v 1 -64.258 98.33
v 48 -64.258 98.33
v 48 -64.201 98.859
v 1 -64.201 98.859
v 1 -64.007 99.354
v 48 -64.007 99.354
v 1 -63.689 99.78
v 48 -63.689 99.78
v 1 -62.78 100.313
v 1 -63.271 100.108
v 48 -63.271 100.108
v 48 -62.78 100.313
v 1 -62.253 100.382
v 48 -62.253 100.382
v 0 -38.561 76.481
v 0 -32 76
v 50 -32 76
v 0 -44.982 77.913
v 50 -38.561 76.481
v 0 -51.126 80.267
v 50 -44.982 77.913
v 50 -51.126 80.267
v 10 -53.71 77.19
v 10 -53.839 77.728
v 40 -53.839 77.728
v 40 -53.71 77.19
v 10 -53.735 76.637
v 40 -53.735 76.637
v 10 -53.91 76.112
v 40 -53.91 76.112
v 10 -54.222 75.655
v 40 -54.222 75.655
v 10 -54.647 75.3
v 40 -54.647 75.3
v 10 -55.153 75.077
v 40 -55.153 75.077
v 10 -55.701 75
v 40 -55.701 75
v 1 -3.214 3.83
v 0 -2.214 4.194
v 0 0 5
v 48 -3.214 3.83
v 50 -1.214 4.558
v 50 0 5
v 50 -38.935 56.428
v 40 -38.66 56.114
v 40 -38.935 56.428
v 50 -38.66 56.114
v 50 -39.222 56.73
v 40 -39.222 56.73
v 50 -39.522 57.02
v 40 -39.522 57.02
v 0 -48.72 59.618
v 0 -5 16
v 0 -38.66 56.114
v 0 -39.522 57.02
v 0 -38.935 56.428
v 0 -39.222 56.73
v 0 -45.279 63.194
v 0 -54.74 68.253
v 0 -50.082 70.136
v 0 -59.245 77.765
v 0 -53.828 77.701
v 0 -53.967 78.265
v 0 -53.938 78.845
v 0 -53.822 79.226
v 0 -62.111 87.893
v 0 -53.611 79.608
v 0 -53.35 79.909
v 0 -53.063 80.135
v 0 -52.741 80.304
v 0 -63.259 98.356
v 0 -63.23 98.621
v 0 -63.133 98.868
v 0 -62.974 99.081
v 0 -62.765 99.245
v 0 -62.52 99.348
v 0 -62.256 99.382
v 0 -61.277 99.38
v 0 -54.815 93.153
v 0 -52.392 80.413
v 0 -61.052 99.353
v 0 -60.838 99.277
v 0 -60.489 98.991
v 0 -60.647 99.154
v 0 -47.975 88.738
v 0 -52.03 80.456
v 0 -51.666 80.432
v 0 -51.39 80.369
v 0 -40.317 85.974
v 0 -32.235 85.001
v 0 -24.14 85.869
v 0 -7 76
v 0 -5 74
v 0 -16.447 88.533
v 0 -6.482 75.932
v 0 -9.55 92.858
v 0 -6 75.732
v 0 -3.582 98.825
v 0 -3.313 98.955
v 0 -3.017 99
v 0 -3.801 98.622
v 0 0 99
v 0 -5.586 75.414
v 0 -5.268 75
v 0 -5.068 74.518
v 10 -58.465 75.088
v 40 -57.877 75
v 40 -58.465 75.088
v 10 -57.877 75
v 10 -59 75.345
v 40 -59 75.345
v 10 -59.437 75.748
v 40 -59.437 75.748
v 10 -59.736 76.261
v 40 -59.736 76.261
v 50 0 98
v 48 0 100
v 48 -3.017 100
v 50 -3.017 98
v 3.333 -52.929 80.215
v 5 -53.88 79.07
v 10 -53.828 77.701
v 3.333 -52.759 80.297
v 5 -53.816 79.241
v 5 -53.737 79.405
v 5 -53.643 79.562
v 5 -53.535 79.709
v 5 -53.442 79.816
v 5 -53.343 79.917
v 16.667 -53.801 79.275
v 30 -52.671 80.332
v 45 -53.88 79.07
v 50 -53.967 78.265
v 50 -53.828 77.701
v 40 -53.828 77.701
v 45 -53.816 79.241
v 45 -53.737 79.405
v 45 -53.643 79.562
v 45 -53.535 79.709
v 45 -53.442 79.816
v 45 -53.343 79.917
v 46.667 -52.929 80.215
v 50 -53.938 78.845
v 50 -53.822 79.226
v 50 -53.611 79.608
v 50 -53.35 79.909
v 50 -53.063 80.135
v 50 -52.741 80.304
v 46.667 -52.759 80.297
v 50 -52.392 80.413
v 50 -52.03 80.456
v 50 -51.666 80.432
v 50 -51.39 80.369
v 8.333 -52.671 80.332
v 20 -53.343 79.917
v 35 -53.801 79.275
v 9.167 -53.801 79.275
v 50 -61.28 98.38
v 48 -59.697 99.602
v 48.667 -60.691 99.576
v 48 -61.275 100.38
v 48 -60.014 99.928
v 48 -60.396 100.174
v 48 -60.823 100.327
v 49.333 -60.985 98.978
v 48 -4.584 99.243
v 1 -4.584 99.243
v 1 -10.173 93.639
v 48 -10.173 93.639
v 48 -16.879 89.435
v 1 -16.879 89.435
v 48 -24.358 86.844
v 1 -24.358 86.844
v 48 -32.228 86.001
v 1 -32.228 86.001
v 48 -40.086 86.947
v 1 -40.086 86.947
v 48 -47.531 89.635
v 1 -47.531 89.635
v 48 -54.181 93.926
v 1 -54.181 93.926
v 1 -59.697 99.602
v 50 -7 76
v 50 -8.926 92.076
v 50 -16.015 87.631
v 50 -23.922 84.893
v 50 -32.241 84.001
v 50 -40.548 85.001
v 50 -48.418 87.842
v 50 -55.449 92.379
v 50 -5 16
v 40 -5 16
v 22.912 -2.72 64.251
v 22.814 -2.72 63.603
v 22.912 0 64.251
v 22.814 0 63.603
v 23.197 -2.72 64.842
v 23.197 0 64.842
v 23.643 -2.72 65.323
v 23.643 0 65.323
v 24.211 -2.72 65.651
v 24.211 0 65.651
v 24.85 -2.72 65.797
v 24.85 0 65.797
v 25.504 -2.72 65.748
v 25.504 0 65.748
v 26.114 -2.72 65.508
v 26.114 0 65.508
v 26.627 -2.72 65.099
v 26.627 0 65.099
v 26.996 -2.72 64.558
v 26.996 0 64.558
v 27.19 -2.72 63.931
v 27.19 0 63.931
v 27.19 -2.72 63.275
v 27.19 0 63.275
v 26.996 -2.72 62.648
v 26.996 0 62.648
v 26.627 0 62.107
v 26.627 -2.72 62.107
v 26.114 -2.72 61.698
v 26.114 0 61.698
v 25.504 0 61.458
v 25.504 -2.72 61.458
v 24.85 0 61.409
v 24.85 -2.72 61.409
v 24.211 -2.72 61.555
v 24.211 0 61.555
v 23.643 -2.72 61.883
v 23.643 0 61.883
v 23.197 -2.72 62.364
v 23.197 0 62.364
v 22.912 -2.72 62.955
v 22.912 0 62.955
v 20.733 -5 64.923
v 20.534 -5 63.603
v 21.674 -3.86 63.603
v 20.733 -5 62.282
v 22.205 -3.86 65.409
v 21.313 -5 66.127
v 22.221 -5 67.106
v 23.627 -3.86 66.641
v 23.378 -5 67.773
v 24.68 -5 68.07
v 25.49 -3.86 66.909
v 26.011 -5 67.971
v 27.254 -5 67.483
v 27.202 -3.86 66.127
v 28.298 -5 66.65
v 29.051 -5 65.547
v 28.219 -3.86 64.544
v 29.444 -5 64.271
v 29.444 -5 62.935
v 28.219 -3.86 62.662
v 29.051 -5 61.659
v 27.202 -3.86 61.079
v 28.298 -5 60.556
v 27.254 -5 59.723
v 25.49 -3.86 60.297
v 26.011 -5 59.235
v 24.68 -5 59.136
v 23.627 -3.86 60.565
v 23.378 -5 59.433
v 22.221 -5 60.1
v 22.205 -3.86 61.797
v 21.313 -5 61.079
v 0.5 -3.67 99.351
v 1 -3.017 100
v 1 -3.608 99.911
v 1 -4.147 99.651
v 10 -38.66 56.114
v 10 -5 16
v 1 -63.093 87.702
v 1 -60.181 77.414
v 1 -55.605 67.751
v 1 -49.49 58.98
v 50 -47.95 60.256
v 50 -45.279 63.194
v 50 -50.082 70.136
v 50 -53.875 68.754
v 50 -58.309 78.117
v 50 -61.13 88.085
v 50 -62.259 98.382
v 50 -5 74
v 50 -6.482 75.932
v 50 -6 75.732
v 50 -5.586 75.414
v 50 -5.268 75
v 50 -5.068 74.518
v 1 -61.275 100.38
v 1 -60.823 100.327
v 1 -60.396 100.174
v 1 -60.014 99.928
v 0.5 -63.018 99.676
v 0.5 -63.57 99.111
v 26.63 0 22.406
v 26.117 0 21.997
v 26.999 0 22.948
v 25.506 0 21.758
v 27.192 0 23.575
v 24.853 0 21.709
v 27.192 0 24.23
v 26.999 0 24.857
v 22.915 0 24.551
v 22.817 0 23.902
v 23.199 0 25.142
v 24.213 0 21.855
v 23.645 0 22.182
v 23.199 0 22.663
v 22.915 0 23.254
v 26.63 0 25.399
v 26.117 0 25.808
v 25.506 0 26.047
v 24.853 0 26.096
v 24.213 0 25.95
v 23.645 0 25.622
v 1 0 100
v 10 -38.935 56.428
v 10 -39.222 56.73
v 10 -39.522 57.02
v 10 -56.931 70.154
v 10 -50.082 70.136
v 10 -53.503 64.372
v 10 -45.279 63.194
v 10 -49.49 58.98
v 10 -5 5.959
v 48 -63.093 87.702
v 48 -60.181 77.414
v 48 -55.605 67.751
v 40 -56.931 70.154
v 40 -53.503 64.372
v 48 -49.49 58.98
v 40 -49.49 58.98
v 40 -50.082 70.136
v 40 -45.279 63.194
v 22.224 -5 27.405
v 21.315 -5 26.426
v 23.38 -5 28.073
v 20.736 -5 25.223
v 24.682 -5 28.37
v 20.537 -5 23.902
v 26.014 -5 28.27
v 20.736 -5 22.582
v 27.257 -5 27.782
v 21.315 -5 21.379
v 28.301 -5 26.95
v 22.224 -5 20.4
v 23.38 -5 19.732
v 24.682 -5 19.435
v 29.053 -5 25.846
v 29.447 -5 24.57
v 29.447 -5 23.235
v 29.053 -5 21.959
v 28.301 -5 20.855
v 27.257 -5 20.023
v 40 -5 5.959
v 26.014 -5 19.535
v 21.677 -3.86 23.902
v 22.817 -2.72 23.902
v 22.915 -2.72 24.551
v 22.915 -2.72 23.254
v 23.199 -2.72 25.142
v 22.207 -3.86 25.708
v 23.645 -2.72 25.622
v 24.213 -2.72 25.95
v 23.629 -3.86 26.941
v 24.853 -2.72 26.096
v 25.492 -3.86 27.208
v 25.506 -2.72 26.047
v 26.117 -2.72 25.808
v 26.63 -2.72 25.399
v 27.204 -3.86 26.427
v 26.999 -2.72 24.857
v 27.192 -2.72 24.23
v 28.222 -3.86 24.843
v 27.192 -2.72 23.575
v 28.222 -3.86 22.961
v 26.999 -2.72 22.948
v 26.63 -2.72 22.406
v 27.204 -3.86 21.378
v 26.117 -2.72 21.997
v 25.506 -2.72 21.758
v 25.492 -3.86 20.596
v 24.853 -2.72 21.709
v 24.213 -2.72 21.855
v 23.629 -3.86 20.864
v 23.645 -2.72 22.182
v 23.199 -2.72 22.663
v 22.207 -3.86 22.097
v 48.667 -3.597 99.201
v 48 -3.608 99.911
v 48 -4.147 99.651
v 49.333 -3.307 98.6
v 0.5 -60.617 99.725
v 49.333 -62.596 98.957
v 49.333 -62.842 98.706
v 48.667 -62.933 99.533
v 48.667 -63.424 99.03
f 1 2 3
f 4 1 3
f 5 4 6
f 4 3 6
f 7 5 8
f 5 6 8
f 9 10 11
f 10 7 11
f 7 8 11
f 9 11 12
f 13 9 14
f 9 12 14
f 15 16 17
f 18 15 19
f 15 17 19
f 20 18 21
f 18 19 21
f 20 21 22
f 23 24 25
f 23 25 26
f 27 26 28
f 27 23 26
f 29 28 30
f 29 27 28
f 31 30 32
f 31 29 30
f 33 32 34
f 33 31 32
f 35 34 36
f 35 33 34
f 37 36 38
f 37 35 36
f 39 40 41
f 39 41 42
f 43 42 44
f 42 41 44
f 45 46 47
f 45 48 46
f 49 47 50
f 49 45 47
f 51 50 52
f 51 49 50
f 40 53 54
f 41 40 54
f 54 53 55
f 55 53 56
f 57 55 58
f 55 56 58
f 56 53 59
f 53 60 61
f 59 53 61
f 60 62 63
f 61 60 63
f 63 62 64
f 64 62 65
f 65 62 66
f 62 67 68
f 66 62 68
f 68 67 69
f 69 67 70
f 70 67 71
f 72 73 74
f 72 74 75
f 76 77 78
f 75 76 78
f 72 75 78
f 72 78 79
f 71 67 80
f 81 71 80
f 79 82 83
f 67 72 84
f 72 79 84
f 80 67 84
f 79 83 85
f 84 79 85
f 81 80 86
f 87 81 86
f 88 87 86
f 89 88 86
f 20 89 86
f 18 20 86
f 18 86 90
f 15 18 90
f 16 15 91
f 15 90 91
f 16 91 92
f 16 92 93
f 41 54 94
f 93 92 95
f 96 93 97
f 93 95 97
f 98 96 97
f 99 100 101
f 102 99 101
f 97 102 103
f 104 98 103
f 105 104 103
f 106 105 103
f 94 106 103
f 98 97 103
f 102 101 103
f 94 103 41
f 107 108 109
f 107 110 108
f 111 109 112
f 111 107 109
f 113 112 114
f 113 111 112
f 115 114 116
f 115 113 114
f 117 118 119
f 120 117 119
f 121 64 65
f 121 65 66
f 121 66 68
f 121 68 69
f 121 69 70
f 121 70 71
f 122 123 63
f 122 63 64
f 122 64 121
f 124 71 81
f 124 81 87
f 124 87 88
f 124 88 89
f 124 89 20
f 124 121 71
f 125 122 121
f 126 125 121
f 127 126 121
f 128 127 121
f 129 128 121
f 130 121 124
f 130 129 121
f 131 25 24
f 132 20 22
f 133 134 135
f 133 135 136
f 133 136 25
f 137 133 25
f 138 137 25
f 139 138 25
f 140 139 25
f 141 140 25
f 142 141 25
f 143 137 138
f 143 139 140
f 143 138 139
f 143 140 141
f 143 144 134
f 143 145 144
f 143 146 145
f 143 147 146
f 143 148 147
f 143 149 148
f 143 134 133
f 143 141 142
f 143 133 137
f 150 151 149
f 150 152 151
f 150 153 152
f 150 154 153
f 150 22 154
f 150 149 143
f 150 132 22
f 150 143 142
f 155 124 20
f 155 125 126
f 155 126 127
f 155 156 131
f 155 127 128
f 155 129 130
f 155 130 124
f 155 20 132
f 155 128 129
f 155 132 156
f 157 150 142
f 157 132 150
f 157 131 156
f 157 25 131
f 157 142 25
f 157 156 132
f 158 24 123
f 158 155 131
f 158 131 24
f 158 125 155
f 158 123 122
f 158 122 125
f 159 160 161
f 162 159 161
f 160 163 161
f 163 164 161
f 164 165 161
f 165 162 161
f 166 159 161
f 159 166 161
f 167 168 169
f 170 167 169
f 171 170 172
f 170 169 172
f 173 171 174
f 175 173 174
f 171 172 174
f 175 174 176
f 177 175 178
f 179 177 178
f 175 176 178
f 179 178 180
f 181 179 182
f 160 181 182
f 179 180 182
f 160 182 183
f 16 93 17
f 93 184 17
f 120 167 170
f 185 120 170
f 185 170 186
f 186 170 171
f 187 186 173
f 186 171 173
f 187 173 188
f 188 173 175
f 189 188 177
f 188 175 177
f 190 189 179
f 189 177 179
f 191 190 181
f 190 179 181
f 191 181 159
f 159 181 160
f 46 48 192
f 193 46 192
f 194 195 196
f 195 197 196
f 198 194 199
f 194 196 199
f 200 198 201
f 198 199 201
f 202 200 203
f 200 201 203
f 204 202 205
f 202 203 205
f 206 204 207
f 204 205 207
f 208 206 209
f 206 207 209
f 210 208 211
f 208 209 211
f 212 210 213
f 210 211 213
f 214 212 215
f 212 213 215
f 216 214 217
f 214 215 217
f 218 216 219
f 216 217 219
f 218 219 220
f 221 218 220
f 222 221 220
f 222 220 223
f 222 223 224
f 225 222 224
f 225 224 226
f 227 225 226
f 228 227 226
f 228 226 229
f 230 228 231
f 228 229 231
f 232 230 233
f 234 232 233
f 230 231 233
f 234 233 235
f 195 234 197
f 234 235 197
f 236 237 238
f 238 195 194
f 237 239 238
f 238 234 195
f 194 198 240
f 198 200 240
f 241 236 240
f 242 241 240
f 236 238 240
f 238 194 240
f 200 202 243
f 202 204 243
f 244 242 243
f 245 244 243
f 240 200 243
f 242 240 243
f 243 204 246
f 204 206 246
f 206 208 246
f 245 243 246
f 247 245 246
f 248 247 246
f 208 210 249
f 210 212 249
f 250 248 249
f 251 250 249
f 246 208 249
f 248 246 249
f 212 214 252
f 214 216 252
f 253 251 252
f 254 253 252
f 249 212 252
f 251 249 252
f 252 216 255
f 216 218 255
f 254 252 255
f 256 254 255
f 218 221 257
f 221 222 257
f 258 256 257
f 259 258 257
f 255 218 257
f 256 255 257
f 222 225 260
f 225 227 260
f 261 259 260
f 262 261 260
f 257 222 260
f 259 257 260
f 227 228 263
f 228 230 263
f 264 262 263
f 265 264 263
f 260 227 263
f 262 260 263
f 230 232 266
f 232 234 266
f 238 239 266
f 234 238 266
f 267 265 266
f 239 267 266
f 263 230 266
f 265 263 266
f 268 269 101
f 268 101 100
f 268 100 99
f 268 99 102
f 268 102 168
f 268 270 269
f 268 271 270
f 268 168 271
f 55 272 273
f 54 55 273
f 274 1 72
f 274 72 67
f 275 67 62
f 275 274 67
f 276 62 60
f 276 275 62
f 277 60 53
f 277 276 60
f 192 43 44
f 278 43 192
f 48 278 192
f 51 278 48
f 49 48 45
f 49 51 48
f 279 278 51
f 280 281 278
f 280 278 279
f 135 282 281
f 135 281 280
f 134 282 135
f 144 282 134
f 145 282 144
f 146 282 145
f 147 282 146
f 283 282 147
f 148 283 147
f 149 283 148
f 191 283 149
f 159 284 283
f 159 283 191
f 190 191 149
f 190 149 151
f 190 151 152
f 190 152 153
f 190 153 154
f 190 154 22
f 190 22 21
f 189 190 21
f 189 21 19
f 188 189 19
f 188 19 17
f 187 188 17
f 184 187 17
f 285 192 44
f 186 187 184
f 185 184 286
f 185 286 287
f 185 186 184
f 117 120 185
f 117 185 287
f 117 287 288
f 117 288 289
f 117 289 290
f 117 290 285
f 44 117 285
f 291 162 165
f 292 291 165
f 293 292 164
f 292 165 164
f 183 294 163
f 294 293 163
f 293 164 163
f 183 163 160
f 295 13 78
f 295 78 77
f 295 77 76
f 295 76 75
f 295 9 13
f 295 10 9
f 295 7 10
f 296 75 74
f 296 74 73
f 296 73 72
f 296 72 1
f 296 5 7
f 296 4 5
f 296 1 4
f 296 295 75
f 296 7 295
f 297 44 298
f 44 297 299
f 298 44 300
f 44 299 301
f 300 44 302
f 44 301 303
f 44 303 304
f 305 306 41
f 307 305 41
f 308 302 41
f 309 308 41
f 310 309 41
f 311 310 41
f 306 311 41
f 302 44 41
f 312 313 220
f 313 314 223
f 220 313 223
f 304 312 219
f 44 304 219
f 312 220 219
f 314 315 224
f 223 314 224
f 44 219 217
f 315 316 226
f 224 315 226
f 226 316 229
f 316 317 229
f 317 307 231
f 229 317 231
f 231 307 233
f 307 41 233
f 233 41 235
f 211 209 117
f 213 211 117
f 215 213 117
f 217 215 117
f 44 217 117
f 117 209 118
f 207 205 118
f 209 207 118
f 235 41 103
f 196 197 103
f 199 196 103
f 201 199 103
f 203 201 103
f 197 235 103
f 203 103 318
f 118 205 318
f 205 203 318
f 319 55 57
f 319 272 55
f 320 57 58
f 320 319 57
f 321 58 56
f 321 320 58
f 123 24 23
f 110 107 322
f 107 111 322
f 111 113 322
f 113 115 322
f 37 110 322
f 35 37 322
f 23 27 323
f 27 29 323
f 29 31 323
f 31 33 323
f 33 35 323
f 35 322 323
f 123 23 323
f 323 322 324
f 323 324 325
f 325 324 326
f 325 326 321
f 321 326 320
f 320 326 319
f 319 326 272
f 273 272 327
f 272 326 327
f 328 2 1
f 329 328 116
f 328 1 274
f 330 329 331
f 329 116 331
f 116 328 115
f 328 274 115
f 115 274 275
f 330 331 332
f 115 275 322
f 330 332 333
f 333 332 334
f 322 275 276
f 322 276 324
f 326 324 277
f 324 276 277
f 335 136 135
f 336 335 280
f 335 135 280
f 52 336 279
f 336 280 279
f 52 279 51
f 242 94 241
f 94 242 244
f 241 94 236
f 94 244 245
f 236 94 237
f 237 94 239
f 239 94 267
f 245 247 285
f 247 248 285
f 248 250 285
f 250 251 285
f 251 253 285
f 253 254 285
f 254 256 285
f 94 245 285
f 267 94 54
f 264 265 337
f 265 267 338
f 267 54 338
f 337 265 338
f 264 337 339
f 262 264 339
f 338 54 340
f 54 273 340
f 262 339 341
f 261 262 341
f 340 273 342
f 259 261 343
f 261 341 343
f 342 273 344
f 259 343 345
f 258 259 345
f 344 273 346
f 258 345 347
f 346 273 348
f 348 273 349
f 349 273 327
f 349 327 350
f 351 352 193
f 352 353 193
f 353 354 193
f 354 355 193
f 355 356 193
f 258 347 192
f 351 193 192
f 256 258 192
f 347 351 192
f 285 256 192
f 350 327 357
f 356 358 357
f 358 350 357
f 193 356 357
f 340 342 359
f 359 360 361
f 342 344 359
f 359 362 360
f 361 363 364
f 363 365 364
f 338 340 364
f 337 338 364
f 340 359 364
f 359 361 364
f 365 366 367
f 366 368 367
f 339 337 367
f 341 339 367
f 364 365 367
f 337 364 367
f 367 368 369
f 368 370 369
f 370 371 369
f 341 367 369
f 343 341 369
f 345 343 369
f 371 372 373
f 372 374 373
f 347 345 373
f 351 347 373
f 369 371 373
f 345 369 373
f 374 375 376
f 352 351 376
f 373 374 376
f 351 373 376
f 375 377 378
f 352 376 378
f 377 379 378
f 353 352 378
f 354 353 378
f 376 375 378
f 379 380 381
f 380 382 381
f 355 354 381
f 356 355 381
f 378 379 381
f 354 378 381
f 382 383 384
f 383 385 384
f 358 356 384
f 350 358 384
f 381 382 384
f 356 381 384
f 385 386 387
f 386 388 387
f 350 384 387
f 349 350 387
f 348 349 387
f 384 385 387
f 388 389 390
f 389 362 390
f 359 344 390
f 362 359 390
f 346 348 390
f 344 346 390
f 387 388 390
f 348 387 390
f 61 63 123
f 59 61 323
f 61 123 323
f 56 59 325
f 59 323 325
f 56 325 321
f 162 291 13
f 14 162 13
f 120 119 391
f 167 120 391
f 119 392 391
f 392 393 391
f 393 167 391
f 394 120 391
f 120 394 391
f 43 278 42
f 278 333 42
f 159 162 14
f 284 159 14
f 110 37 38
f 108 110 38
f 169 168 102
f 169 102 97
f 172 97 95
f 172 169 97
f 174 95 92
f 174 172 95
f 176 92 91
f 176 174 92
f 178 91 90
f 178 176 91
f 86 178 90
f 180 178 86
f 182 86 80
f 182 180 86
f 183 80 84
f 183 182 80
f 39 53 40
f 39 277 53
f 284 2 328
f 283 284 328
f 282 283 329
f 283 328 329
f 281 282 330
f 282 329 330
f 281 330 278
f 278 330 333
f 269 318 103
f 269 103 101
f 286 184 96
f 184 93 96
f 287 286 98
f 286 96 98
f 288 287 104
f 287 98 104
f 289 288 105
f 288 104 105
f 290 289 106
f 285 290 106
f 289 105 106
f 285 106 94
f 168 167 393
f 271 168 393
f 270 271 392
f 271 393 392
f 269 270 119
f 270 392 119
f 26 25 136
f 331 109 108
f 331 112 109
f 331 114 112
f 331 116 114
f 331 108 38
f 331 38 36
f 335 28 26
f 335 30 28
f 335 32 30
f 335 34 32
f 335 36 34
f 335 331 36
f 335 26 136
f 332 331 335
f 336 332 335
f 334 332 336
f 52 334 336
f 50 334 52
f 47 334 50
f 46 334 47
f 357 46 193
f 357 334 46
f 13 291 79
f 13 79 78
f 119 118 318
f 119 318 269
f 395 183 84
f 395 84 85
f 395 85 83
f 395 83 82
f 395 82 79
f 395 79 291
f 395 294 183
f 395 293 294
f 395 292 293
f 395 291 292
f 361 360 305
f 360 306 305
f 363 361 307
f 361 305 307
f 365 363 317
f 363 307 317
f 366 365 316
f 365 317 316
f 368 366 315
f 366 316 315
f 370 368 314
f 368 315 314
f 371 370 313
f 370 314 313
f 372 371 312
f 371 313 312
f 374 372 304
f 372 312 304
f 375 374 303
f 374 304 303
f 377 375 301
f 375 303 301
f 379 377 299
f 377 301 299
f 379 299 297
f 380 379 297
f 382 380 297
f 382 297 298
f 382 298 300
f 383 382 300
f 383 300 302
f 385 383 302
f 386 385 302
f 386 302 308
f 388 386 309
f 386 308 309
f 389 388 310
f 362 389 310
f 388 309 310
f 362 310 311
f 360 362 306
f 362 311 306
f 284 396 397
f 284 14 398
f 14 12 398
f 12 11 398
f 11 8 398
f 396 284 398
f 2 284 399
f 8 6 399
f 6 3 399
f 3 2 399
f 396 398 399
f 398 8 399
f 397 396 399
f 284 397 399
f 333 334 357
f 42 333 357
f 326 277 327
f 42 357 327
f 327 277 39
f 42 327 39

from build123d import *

# Parameters (mm, degrees)
F1_DEPTH       = 50
F4_DEPTH       = 25
F5_W           = 30
F5_H           = 60
F6_DEPTH       = 75
F8_D           = 4.4
F8_CSINK_D     = 8.96
F8_CSINK_ANGLE = 90
F9_R           = 2
F10_T1_DEPTH   = 30
F11_R          = 10
F12_SIZE       = 1.99999
F13_SIZE       = 1
F14_SIZE       = 5


# Not quite as in the source:
# - a fillet or chamfer that OpenCascade refuses, or shapes differently, is made with other operations: its cross-section is extruded or revolved along the edge and cut away or added
# - a fillet or chamfer is up to 0.001 mm smaller than in the source, because OpenCascade refuses the exact size


with BuildPart() as f1:
    # F0 (on Right) → F1 (new body)
    with BuildSketch(Plane.YZ):
        with BuildLine():
            Line((-49.4901207083, 58.9800291521), (0, 0))
            Line((0, 0), (0, 100))
            Line((0, 100), (-4, 100))
            ThreePointArc((-4, 100), (-32.2344149115, 86.0007850138), (-60.2787795686, 100.3769394581))
            Line((-60.2787795686, 100.3769394581), (-64.2787644391, 100.3879410703))
            ThreePointArc((-64.2787644391, 100.3879410703), (-60.5350609092, 78.3801837008), (-49.4901207083, 58.9800291521))
        make_face()
    extrude(amount=F1_DEPTH)

    # F3 (on offset) → F4 (cut, symmetric)
    with BuildSketch(Plane.YZ.offset(25)):
        with BuildLine():
            ThreePointArc((-32, 76), (-44.2642678148, 77.703490499), (-55.5999994652, 82.684989557))
            ThreePointArc((-55.5999994652, 82.684989557), (-49.1013266214, 68.5324924594), (-39.0785260857, 56.6132058929))
            Line((-39.0785260857, 56.6132058929), (-5, 16))
            Line((-5, 16), (-5, 76))
            Line((-5, 76), (-32, 76))
        make_face()
    extrude(amount=F4_DEPTH, both=True, mode=Mode.SUBTRACT)

    # F5 (on Top) → F6 (cut)
    with BuildSketch(Plane.XY):
        with Locations((25, -35)):
            Rectangle(F5_W, F5_H)
    extrude(amount=F6_DEPTH, mode=Mode.SUBTRACT)

    # F8 (through all)
    with Locations(Plane.XZ.offset(5)):
        with Locations((25.014353916, 63.602976501), (25.0169411302, 23.9024478942)):
            CounterSinkHole(F8_D / 2, F8_CSINK_D / 2, counter_sink_angle=F8_CSINK_ANGLE)

    # F9
    f9_edges = [f1.edges().sort_by_distance(p)[0] for p in [
        (25, -64.278764, 100.387941),
        (25, -60.27878, 100.376939),
        (25, -4, 100),
        (25, -59.21917, 75),
        (25, -55.599999, 82.68499),
        (25, -5, 76),
    ]]
    fillet(f9_edges, radius=F9_R)

    # F10: fillet of radius 2 on 1 edges, made by hand

    # F10_s2 → F10_t1 (cut)
    with BuildSketch(Plane.YZ.offset(10)):
        with BuildLine():
            ThreePointArc((-53.8387023607, 77.7281856581), (-54.0497056605, 75.8722525363), (-55.7014276886, 75))
            Line((-55.7014276886, 75), (-55.7014276886, 74.8))
            Line((-55.7014276886, 74.8), (-52.6458541761, 74.8))
            Line((-52.6458541761, 74.8), (-52.4647225466, 75.0848017263))
            ThreePointArc((-52.4647225466, 75.0848017263), (-53.6427658792, 77.7768016426), (-53.6524298279, 77.8010042239))
            Line((-53.6524298279, 77.8010042239), (-53.8387023607, 77.7281856581))
        make_face()
    extrude(amount=F10_T1_DEPTH, mode=Mode.SUBTRACT)

    # F11
    f11_edges = [f1.edges().sort_by_distance(p)[0] for p in [
        (45, -39.078526, 56.613206),
        (5, -39.078526, 56.613206),
    ]]
    fillet(f11_edges, radius=F11_R)

    # F12 (size 2 in the source; OpenCascade refuses exactly that, so slightly less here)
    f12_edges = [f1.edges().sort_by_distance(p)[0] for p in [
        (50, -32.228082, 86.000743),
        (50, -60.18128, 77.414084),
        (50, -63.689465, 99.780073),
        (50, -61.763987, 100.381024),
        (50, -60.395948, 100.173665),
        (50, -3.887164, 99.800901),
        (50, -1.508623, 100),
        (50, -24.74506, 29.490015),
    ]]
    chamfer(f12_edges, length=F12_SIZE)

    # F13
    f13_edges = [f1.edges().sort_by_distance(p)[0] for p in [
        (0, -1.508623, 100),
        (0, -3.887164, 99.800901),
        (0, -32.228082, 86.000743),
        (0, -60.395948, 100.173665),
        (0, -61.763987, 100.381024),
        (0, -63.689465, 99.780073),
        (0, -60.18128, 77.414084),
        (0, -24.74506, 29.490015),
    ]]
    chamfer(f13_edges, length=F13_SIZE)

    # F14
    f14_edges = [f1.edges().sort_by_distance(p)[0] for p in [
        (24.500005, 0, 0),
    ]]
    chamfer(f14_edges, length=F14_SIZE)


solid = f1.part
